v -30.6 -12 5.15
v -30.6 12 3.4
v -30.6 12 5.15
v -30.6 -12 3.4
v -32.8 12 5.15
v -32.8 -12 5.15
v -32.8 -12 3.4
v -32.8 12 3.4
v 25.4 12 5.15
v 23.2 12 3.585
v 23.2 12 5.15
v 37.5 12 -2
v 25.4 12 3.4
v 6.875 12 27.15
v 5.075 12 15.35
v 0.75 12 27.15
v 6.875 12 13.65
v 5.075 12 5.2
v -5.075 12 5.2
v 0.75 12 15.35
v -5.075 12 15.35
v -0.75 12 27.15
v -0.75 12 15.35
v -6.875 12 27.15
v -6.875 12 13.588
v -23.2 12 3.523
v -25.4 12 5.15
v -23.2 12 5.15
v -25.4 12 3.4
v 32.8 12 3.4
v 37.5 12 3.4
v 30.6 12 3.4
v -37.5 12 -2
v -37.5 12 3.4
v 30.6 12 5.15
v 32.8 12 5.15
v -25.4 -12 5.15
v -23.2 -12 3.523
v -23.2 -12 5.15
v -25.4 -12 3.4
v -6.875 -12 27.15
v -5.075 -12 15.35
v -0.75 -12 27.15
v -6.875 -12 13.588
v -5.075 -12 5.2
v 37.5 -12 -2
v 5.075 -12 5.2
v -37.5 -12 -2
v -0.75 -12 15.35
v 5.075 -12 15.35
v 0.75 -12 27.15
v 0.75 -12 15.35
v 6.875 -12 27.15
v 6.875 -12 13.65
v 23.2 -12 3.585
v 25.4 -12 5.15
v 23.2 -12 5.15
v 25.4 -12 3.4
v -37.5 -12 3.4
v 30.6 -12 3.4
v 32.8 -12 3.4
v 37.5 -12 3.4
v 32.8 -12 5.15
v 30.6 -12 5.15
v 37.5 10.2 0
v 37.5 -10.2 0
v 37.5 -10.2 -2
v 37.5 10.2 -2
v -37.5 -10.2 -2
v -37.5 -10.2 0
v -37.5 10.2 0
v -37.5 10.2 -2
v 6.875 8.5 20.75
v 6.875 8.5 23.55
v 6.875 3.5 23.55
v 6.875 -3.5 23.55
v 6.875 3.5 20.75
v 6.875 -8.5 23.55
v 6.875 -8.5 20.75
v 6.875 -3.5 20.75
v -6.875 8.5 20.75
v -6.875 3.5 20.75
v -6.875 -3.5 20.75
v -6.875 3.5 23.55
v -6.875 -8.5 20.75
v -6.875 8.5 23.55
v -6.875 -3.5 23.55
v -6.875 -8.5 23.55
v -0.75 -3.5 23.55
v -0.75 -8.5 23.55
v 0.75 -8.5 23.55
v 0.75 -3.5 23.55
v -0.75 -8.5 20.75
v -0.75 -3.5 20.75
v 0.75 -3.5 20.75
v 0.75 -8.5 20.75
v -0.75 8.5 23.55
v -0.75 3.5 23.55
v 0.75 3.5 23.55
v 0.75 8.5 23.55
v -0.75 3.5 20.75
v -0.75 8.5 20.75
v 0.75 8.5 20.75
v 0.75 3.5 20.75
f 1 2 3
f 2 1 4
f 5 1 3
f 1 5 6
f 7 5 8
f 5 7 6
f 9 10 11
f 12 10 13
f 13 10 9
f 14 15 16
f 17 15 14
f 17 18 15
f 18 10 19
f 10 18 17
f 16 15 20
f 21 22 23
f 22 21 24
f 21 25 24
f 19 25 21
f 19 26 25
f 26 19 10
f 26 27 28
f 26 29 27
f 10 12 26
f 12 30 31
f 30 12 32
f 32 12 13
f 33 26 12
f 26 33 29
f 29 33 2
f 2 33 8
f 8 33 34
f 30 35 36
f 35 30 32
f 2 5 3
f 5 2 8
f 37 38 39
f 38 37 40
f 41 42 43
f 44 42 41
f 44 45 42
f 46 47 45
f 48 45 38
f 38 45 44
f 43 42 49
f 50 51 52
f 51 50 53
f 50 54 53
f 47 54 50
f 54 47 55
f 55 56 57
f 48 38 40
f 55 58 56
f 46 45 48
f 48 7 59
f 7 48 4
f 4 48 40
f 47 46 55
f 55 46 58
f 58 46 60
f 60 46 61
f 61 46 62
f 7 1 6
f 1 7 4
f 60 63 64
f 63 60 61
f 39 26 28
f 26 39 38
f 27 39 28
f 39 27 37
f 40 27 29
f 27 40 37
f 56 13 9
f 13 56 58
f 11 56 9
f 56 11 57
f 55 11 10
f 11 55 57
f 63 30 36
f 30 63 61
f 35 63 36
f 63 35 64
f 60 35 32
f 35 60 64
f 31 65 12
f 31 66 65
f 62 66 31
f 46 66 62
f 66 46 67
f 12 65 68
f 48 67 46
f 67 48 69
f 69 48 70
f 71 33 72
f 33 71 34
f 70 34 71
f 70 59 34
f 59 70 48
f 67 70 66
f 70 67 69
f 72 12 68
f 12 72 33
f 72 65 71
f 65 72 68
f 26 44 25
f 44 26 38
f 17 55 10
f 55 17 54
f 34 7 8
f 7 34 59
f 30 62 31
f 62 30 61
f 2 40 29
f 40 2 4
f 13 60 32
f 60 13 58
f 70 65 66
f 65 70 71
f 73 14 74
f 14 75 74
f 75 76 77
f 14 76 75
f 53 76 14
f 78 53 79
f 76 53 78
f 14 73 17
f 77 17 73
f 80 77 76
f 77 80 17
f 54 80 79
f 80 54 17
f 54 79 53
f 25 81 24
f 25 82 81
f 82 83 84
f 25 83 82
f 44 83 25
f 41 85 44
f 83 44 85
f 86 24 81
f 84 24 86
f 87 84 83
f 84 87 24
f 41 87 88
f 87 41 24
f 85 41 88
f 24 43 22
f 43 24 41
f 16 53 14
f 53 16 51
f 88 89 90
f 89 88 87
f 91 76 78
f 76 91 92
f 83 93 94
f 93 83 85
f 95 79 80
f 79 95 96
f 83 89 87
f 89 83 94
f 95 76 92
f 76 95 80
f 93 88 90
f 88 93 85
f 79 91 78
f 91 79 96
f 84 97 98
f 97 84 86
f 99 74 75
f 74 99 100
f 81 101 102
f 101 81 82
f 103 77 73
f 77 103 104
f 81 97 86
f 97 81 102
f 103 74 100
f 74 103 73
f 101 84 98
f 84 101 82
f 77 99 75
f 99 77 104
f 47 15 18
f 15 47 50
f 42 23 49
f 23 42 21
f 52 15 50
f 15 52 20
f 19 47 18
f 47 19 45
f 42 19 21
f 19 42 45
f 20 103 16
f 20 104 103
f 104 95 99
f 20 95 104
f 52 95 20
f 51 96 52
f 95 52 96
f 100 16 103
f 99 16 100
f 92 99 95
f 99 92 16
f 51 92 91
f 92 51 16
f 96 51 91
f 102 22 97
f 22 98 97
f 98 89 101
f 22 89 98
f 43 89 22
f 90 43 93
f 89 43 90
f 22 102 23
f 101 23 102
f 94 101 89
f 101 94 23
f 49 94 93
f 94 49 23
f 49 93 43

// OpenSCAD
// ===================================================================
// Project: OpenStickFPV
// Component: Standalone Landing Gear Mount (20mm Clear Pocket + Wall Offset)
// - Sized gear_plate_y dynamically so the inner pocket between the front
//   and rear retaining walls fits a 20.0mm landing gear + tolerance:
//     * gear_pocket_y = 20.0 + 0.4 (tolerance) = 20.4mm
//     * gear_plate_y  = 20.4 + 2 * 1.8 (walls) = 24.0mm (Y = +/- 12.0mm)
// - Matched mount_length = gear_plate_y (24.0mm) so front/rear faces
//   remain 100% coplanar for support-free sideways 3D printing
// - Dual upper spar clamp zip-tie slots automatically scale to
//   +/- 6.0mm (halfway from center to the +/- 12.0mm edges)
// - Compact 75.0mm lateral gear plate with outboard zip-tie channel
//   guides at X = +/- 28.0mm and continuous 1.0mm downward retaining lips
// ===================================================================

$fn = 50;

// --- Landing Gear Pocket & Wall Spec (20mm Gear + Walls + Tolerance) ---
gear_strut_y         = 20.0;   // Actual landing gear width along Y-axis
gear_pocket_tol      = 0.4;    // Fit clearance (+0.2mm per side)
gear_wall_thick      = 1.8;    // Front/rear retaining wall thickness
gear_wall_height     = 2.0;    // Low-profile 1.0mm downward lip below plate

// Derived total Y-width: 20.0 + 0.4 + 2*(1.8) = 24.0mm
gear_plate_y         = gear_strut_y + gear_pocket_tol + 2 * gear_wall_thick;

// --- Fuselage Spar Spec (10x10mm Square) ---
spar_width           = 10.15;  // 10x10mm spar (+0.15mm printer tolerance)
spar_height          = 10.15;  // 10x10mm spar height
sleeve_wall          = 1.8;    // Structural collar wall thickness
mount_length         = gear_plate_y; // 24.0mm (coplanar with gear plate Y = +/- 12.0mm)

// --- Top Zip-Tie Clamping System (Halfway from Center to Side Edges) ---
clamp_rise           = 10.0;   // Extension above the collar top for zip-tie slots
ziptie_slot_w        = 5.0;    // Slot width along fuselage (fits up to 4.8mm ties)
ziptie_slot_h        = 2.8;    // Slot vertical clearance (Z-axis)
pinch_slit_w         = 1.5;    // Top longitudinal compression slit

// Halfway between center (0) and side edges (+/- mount_length/2 = +/- 12.0mm)
ziptie_y_positions   = [
    -mount_length / 4,  // -6.0mm
     mount_length / 4   // +6.0mm
];

// --- Bottom Landing Gear Plate Spec ---
gear_plate_x         = 75.0;   // 75.0mm span (outer edges at X = +/- 37.5mm)
gear_plate_thick     = 3.4;    // Full unbroken thickness across entire plate

// --- Raised Zip-Tie Channel Guides (Seated Flat on Plate Deck) ---
gear_tie_width       = 5.2;    // Channel clearance width (fits up to 4.8mm ties)
guide_rib_height     = 1.8;    // Height of raised guide walls above plate
guide_rib_thick      = 2.2;    // Thickness of each raised guide wall along X-axis
gear_tie_edge_margin = 4.7;    // Margin from plate outer edge to outer rib edge
gear_tie_offset_x    = gear_plate_x/2 - gear_tie_edge_margin - guide_rib_thick - gear_tie_width/2; // +/- 28.0mm
gear_tie_x_offsets   = [-gear_tie_offset_x, gear_tie_offset_x];

// --- Gusset Termination Spec ---
gusset_top_offset    = 3.5;    // Terminates below collar top so clamping leaves stay flexible

// Derived Dimensions
collar_w          = spar_width + 2 * sleeve_wall;   // ~13.75mm
collar_h          = spar_height + 2 * sleeve_wall;  // ~13.75mm

gear_bottom_z     = 0;
gear_top_z        = gear_bottom_z + gear_plate_thick;

spar_collar_bot_z = gear_top_z;
spar_collar_top_z = spar_collar_bot_z + collar_h;

clamp_top_z       = spar_collar_top_z + clamp_rise;
ziptie_z          = spar_collar_top_z + clamp_rise / 2;
gusset_end_z      = spar_collar_top_z - gusset_top_offset;

// Inner edge of the inboard raised zip-tie guide rib (~23.2mm)
inner_guide_x     = gear_tie_offset_x - gear_tie_width/2 - guide_rib_thick;

module standalone_landing_gear_mount_v17() {
    difference() {
        // -------------------------------------------------------------
        // 1. ADDITIVE SHAPES
        // -------------------------------------------------------------
        union() {
            // A. Full-Thickness Widened Landing Gear Plate (75mm x 24.0mm x 3.4mm)
            translate([-gear_plate_x/2, -gear_plate_y/2, gear_bottom_z])
                cube([gear_plate_x, gear_plate_y, gear_plate_thick]);

            // B. Raised Zip-Tie Guide Ribs (Seated Flat on Top Face at X = +/- 28.0mm)
            for (gx = gear_tie_x_offsets) {
                for (side = [-1, 1]) {
                    translate([
                        gx + side * (gear_tie_width/2 + guide_rib_thick/2),
                        0,
                        gear_top_z + guide_rib_height/2 - 0.1
                    ])
                        cube([guide_rib_thick, gear_plate_y, guide_rib_height + 0.1], center = true);
                }
            }

            // C. Continuous Front (+Y) & Rear (-Y) Downward Retaining Walls (1.0mm)
            // Leaves a 20.4mm inner pocket (20.0mm gear + 0.4mm fit tolerance)
            for (sy = [-1, 1]) {
                translate([
                    -gear_plate_x/2,
                    sy > 0 ? (gear_plate_y/2 - gear_wall_thick) : (-gear_plate_y/2),
                    gear_bottom_z - gear_wall_height
                ])
                    cube([gear_plate_x, gear_wall_thick, gear_wall_height + 0.1]);
            }

            // D. Central 10x10mm Spar Sleeve Core (24.0mm Length, Flush with Plate)
            translate([-collar_w/2, -mount_length/2, spar_collar_bot_z])
                cube([collar_w, mount_length, collar_h]);

            // E. Extended Top Zip-Tie Clamp Body (10mm rise, flush collar width)
            translate([-collar_w/2, -mount_length/2, spar_collar_top_z - 0.1])
                cube([collar_w, mount_length, clamp_rise + 0.1]);

            // F. Diagonal Gussets Flush with Front/Rear Faces (Y = +/- 12.0mm)
            for (sx = [-1, 1]) {
                hull() {
                    // Inner root: lands on collar side wall & ends (Y = +/- 12.0mm)
                    translate([sx * (collar_w/2 - 0.1), -mount_length/2, spar_collar_bot_z])
                        cube([0.1, mount_length, gusset_end_z - spar_collar_bot_z]);

                    // Outboard foot: ties straight into the inner zip-tie guide rib (~23.2mm)
                    // while staying flush with the front/rear faces (Y = +/- 12.0mm)
                    translate([sx * (inner_guide_x + 0.2), -mount_length/2, gear_top_z - 0.1])
                        cube([0.1, mount_length, 0.1]);
                }
            }
        }

        // -------------------------------------------------------------
        // 2. 10x10mm CARBON SPAR CAVITY
        // -------------------------------------------------------------
        translate([-spar_width/2, -mount_length/2 - 1, spar_collar_bot_z + sleeve_wall])
            cube([spar_width, mount_length + 2, spar_height]);

        // -------------------------------------------------------------
        // 3. DUAL TOP LATERAL ZIP-TIE SLOTS (Halfway from Center to Edges)
        // -------------------------------------------------------------
        for (zy = ziptie_y_positions) {
            for (sx = [-1, 1]) {
                translate([sx * collar_w/4, zy, ziptie_z])
                    cube([collar_w/2 + 2, ziptie_slot_w, ziptie_slot_h], center = true);
            }
        }

        // -------------------------------------------------------------
        // 4. TOP LONGITUDINAL COMPRESSION SLIT
        // -------------------------------------------------------------
        translate([-pinch_slit_w/2, -mount_length/2 - 1, spar_collar_top_z - sleeve_wall - 0.2])
            cube([pinch_slit_w, mount_length + 2, clamp_rise + sleeve_wall + 1.2]);
    }
}

standalone_landing_gear_mount_v17();
